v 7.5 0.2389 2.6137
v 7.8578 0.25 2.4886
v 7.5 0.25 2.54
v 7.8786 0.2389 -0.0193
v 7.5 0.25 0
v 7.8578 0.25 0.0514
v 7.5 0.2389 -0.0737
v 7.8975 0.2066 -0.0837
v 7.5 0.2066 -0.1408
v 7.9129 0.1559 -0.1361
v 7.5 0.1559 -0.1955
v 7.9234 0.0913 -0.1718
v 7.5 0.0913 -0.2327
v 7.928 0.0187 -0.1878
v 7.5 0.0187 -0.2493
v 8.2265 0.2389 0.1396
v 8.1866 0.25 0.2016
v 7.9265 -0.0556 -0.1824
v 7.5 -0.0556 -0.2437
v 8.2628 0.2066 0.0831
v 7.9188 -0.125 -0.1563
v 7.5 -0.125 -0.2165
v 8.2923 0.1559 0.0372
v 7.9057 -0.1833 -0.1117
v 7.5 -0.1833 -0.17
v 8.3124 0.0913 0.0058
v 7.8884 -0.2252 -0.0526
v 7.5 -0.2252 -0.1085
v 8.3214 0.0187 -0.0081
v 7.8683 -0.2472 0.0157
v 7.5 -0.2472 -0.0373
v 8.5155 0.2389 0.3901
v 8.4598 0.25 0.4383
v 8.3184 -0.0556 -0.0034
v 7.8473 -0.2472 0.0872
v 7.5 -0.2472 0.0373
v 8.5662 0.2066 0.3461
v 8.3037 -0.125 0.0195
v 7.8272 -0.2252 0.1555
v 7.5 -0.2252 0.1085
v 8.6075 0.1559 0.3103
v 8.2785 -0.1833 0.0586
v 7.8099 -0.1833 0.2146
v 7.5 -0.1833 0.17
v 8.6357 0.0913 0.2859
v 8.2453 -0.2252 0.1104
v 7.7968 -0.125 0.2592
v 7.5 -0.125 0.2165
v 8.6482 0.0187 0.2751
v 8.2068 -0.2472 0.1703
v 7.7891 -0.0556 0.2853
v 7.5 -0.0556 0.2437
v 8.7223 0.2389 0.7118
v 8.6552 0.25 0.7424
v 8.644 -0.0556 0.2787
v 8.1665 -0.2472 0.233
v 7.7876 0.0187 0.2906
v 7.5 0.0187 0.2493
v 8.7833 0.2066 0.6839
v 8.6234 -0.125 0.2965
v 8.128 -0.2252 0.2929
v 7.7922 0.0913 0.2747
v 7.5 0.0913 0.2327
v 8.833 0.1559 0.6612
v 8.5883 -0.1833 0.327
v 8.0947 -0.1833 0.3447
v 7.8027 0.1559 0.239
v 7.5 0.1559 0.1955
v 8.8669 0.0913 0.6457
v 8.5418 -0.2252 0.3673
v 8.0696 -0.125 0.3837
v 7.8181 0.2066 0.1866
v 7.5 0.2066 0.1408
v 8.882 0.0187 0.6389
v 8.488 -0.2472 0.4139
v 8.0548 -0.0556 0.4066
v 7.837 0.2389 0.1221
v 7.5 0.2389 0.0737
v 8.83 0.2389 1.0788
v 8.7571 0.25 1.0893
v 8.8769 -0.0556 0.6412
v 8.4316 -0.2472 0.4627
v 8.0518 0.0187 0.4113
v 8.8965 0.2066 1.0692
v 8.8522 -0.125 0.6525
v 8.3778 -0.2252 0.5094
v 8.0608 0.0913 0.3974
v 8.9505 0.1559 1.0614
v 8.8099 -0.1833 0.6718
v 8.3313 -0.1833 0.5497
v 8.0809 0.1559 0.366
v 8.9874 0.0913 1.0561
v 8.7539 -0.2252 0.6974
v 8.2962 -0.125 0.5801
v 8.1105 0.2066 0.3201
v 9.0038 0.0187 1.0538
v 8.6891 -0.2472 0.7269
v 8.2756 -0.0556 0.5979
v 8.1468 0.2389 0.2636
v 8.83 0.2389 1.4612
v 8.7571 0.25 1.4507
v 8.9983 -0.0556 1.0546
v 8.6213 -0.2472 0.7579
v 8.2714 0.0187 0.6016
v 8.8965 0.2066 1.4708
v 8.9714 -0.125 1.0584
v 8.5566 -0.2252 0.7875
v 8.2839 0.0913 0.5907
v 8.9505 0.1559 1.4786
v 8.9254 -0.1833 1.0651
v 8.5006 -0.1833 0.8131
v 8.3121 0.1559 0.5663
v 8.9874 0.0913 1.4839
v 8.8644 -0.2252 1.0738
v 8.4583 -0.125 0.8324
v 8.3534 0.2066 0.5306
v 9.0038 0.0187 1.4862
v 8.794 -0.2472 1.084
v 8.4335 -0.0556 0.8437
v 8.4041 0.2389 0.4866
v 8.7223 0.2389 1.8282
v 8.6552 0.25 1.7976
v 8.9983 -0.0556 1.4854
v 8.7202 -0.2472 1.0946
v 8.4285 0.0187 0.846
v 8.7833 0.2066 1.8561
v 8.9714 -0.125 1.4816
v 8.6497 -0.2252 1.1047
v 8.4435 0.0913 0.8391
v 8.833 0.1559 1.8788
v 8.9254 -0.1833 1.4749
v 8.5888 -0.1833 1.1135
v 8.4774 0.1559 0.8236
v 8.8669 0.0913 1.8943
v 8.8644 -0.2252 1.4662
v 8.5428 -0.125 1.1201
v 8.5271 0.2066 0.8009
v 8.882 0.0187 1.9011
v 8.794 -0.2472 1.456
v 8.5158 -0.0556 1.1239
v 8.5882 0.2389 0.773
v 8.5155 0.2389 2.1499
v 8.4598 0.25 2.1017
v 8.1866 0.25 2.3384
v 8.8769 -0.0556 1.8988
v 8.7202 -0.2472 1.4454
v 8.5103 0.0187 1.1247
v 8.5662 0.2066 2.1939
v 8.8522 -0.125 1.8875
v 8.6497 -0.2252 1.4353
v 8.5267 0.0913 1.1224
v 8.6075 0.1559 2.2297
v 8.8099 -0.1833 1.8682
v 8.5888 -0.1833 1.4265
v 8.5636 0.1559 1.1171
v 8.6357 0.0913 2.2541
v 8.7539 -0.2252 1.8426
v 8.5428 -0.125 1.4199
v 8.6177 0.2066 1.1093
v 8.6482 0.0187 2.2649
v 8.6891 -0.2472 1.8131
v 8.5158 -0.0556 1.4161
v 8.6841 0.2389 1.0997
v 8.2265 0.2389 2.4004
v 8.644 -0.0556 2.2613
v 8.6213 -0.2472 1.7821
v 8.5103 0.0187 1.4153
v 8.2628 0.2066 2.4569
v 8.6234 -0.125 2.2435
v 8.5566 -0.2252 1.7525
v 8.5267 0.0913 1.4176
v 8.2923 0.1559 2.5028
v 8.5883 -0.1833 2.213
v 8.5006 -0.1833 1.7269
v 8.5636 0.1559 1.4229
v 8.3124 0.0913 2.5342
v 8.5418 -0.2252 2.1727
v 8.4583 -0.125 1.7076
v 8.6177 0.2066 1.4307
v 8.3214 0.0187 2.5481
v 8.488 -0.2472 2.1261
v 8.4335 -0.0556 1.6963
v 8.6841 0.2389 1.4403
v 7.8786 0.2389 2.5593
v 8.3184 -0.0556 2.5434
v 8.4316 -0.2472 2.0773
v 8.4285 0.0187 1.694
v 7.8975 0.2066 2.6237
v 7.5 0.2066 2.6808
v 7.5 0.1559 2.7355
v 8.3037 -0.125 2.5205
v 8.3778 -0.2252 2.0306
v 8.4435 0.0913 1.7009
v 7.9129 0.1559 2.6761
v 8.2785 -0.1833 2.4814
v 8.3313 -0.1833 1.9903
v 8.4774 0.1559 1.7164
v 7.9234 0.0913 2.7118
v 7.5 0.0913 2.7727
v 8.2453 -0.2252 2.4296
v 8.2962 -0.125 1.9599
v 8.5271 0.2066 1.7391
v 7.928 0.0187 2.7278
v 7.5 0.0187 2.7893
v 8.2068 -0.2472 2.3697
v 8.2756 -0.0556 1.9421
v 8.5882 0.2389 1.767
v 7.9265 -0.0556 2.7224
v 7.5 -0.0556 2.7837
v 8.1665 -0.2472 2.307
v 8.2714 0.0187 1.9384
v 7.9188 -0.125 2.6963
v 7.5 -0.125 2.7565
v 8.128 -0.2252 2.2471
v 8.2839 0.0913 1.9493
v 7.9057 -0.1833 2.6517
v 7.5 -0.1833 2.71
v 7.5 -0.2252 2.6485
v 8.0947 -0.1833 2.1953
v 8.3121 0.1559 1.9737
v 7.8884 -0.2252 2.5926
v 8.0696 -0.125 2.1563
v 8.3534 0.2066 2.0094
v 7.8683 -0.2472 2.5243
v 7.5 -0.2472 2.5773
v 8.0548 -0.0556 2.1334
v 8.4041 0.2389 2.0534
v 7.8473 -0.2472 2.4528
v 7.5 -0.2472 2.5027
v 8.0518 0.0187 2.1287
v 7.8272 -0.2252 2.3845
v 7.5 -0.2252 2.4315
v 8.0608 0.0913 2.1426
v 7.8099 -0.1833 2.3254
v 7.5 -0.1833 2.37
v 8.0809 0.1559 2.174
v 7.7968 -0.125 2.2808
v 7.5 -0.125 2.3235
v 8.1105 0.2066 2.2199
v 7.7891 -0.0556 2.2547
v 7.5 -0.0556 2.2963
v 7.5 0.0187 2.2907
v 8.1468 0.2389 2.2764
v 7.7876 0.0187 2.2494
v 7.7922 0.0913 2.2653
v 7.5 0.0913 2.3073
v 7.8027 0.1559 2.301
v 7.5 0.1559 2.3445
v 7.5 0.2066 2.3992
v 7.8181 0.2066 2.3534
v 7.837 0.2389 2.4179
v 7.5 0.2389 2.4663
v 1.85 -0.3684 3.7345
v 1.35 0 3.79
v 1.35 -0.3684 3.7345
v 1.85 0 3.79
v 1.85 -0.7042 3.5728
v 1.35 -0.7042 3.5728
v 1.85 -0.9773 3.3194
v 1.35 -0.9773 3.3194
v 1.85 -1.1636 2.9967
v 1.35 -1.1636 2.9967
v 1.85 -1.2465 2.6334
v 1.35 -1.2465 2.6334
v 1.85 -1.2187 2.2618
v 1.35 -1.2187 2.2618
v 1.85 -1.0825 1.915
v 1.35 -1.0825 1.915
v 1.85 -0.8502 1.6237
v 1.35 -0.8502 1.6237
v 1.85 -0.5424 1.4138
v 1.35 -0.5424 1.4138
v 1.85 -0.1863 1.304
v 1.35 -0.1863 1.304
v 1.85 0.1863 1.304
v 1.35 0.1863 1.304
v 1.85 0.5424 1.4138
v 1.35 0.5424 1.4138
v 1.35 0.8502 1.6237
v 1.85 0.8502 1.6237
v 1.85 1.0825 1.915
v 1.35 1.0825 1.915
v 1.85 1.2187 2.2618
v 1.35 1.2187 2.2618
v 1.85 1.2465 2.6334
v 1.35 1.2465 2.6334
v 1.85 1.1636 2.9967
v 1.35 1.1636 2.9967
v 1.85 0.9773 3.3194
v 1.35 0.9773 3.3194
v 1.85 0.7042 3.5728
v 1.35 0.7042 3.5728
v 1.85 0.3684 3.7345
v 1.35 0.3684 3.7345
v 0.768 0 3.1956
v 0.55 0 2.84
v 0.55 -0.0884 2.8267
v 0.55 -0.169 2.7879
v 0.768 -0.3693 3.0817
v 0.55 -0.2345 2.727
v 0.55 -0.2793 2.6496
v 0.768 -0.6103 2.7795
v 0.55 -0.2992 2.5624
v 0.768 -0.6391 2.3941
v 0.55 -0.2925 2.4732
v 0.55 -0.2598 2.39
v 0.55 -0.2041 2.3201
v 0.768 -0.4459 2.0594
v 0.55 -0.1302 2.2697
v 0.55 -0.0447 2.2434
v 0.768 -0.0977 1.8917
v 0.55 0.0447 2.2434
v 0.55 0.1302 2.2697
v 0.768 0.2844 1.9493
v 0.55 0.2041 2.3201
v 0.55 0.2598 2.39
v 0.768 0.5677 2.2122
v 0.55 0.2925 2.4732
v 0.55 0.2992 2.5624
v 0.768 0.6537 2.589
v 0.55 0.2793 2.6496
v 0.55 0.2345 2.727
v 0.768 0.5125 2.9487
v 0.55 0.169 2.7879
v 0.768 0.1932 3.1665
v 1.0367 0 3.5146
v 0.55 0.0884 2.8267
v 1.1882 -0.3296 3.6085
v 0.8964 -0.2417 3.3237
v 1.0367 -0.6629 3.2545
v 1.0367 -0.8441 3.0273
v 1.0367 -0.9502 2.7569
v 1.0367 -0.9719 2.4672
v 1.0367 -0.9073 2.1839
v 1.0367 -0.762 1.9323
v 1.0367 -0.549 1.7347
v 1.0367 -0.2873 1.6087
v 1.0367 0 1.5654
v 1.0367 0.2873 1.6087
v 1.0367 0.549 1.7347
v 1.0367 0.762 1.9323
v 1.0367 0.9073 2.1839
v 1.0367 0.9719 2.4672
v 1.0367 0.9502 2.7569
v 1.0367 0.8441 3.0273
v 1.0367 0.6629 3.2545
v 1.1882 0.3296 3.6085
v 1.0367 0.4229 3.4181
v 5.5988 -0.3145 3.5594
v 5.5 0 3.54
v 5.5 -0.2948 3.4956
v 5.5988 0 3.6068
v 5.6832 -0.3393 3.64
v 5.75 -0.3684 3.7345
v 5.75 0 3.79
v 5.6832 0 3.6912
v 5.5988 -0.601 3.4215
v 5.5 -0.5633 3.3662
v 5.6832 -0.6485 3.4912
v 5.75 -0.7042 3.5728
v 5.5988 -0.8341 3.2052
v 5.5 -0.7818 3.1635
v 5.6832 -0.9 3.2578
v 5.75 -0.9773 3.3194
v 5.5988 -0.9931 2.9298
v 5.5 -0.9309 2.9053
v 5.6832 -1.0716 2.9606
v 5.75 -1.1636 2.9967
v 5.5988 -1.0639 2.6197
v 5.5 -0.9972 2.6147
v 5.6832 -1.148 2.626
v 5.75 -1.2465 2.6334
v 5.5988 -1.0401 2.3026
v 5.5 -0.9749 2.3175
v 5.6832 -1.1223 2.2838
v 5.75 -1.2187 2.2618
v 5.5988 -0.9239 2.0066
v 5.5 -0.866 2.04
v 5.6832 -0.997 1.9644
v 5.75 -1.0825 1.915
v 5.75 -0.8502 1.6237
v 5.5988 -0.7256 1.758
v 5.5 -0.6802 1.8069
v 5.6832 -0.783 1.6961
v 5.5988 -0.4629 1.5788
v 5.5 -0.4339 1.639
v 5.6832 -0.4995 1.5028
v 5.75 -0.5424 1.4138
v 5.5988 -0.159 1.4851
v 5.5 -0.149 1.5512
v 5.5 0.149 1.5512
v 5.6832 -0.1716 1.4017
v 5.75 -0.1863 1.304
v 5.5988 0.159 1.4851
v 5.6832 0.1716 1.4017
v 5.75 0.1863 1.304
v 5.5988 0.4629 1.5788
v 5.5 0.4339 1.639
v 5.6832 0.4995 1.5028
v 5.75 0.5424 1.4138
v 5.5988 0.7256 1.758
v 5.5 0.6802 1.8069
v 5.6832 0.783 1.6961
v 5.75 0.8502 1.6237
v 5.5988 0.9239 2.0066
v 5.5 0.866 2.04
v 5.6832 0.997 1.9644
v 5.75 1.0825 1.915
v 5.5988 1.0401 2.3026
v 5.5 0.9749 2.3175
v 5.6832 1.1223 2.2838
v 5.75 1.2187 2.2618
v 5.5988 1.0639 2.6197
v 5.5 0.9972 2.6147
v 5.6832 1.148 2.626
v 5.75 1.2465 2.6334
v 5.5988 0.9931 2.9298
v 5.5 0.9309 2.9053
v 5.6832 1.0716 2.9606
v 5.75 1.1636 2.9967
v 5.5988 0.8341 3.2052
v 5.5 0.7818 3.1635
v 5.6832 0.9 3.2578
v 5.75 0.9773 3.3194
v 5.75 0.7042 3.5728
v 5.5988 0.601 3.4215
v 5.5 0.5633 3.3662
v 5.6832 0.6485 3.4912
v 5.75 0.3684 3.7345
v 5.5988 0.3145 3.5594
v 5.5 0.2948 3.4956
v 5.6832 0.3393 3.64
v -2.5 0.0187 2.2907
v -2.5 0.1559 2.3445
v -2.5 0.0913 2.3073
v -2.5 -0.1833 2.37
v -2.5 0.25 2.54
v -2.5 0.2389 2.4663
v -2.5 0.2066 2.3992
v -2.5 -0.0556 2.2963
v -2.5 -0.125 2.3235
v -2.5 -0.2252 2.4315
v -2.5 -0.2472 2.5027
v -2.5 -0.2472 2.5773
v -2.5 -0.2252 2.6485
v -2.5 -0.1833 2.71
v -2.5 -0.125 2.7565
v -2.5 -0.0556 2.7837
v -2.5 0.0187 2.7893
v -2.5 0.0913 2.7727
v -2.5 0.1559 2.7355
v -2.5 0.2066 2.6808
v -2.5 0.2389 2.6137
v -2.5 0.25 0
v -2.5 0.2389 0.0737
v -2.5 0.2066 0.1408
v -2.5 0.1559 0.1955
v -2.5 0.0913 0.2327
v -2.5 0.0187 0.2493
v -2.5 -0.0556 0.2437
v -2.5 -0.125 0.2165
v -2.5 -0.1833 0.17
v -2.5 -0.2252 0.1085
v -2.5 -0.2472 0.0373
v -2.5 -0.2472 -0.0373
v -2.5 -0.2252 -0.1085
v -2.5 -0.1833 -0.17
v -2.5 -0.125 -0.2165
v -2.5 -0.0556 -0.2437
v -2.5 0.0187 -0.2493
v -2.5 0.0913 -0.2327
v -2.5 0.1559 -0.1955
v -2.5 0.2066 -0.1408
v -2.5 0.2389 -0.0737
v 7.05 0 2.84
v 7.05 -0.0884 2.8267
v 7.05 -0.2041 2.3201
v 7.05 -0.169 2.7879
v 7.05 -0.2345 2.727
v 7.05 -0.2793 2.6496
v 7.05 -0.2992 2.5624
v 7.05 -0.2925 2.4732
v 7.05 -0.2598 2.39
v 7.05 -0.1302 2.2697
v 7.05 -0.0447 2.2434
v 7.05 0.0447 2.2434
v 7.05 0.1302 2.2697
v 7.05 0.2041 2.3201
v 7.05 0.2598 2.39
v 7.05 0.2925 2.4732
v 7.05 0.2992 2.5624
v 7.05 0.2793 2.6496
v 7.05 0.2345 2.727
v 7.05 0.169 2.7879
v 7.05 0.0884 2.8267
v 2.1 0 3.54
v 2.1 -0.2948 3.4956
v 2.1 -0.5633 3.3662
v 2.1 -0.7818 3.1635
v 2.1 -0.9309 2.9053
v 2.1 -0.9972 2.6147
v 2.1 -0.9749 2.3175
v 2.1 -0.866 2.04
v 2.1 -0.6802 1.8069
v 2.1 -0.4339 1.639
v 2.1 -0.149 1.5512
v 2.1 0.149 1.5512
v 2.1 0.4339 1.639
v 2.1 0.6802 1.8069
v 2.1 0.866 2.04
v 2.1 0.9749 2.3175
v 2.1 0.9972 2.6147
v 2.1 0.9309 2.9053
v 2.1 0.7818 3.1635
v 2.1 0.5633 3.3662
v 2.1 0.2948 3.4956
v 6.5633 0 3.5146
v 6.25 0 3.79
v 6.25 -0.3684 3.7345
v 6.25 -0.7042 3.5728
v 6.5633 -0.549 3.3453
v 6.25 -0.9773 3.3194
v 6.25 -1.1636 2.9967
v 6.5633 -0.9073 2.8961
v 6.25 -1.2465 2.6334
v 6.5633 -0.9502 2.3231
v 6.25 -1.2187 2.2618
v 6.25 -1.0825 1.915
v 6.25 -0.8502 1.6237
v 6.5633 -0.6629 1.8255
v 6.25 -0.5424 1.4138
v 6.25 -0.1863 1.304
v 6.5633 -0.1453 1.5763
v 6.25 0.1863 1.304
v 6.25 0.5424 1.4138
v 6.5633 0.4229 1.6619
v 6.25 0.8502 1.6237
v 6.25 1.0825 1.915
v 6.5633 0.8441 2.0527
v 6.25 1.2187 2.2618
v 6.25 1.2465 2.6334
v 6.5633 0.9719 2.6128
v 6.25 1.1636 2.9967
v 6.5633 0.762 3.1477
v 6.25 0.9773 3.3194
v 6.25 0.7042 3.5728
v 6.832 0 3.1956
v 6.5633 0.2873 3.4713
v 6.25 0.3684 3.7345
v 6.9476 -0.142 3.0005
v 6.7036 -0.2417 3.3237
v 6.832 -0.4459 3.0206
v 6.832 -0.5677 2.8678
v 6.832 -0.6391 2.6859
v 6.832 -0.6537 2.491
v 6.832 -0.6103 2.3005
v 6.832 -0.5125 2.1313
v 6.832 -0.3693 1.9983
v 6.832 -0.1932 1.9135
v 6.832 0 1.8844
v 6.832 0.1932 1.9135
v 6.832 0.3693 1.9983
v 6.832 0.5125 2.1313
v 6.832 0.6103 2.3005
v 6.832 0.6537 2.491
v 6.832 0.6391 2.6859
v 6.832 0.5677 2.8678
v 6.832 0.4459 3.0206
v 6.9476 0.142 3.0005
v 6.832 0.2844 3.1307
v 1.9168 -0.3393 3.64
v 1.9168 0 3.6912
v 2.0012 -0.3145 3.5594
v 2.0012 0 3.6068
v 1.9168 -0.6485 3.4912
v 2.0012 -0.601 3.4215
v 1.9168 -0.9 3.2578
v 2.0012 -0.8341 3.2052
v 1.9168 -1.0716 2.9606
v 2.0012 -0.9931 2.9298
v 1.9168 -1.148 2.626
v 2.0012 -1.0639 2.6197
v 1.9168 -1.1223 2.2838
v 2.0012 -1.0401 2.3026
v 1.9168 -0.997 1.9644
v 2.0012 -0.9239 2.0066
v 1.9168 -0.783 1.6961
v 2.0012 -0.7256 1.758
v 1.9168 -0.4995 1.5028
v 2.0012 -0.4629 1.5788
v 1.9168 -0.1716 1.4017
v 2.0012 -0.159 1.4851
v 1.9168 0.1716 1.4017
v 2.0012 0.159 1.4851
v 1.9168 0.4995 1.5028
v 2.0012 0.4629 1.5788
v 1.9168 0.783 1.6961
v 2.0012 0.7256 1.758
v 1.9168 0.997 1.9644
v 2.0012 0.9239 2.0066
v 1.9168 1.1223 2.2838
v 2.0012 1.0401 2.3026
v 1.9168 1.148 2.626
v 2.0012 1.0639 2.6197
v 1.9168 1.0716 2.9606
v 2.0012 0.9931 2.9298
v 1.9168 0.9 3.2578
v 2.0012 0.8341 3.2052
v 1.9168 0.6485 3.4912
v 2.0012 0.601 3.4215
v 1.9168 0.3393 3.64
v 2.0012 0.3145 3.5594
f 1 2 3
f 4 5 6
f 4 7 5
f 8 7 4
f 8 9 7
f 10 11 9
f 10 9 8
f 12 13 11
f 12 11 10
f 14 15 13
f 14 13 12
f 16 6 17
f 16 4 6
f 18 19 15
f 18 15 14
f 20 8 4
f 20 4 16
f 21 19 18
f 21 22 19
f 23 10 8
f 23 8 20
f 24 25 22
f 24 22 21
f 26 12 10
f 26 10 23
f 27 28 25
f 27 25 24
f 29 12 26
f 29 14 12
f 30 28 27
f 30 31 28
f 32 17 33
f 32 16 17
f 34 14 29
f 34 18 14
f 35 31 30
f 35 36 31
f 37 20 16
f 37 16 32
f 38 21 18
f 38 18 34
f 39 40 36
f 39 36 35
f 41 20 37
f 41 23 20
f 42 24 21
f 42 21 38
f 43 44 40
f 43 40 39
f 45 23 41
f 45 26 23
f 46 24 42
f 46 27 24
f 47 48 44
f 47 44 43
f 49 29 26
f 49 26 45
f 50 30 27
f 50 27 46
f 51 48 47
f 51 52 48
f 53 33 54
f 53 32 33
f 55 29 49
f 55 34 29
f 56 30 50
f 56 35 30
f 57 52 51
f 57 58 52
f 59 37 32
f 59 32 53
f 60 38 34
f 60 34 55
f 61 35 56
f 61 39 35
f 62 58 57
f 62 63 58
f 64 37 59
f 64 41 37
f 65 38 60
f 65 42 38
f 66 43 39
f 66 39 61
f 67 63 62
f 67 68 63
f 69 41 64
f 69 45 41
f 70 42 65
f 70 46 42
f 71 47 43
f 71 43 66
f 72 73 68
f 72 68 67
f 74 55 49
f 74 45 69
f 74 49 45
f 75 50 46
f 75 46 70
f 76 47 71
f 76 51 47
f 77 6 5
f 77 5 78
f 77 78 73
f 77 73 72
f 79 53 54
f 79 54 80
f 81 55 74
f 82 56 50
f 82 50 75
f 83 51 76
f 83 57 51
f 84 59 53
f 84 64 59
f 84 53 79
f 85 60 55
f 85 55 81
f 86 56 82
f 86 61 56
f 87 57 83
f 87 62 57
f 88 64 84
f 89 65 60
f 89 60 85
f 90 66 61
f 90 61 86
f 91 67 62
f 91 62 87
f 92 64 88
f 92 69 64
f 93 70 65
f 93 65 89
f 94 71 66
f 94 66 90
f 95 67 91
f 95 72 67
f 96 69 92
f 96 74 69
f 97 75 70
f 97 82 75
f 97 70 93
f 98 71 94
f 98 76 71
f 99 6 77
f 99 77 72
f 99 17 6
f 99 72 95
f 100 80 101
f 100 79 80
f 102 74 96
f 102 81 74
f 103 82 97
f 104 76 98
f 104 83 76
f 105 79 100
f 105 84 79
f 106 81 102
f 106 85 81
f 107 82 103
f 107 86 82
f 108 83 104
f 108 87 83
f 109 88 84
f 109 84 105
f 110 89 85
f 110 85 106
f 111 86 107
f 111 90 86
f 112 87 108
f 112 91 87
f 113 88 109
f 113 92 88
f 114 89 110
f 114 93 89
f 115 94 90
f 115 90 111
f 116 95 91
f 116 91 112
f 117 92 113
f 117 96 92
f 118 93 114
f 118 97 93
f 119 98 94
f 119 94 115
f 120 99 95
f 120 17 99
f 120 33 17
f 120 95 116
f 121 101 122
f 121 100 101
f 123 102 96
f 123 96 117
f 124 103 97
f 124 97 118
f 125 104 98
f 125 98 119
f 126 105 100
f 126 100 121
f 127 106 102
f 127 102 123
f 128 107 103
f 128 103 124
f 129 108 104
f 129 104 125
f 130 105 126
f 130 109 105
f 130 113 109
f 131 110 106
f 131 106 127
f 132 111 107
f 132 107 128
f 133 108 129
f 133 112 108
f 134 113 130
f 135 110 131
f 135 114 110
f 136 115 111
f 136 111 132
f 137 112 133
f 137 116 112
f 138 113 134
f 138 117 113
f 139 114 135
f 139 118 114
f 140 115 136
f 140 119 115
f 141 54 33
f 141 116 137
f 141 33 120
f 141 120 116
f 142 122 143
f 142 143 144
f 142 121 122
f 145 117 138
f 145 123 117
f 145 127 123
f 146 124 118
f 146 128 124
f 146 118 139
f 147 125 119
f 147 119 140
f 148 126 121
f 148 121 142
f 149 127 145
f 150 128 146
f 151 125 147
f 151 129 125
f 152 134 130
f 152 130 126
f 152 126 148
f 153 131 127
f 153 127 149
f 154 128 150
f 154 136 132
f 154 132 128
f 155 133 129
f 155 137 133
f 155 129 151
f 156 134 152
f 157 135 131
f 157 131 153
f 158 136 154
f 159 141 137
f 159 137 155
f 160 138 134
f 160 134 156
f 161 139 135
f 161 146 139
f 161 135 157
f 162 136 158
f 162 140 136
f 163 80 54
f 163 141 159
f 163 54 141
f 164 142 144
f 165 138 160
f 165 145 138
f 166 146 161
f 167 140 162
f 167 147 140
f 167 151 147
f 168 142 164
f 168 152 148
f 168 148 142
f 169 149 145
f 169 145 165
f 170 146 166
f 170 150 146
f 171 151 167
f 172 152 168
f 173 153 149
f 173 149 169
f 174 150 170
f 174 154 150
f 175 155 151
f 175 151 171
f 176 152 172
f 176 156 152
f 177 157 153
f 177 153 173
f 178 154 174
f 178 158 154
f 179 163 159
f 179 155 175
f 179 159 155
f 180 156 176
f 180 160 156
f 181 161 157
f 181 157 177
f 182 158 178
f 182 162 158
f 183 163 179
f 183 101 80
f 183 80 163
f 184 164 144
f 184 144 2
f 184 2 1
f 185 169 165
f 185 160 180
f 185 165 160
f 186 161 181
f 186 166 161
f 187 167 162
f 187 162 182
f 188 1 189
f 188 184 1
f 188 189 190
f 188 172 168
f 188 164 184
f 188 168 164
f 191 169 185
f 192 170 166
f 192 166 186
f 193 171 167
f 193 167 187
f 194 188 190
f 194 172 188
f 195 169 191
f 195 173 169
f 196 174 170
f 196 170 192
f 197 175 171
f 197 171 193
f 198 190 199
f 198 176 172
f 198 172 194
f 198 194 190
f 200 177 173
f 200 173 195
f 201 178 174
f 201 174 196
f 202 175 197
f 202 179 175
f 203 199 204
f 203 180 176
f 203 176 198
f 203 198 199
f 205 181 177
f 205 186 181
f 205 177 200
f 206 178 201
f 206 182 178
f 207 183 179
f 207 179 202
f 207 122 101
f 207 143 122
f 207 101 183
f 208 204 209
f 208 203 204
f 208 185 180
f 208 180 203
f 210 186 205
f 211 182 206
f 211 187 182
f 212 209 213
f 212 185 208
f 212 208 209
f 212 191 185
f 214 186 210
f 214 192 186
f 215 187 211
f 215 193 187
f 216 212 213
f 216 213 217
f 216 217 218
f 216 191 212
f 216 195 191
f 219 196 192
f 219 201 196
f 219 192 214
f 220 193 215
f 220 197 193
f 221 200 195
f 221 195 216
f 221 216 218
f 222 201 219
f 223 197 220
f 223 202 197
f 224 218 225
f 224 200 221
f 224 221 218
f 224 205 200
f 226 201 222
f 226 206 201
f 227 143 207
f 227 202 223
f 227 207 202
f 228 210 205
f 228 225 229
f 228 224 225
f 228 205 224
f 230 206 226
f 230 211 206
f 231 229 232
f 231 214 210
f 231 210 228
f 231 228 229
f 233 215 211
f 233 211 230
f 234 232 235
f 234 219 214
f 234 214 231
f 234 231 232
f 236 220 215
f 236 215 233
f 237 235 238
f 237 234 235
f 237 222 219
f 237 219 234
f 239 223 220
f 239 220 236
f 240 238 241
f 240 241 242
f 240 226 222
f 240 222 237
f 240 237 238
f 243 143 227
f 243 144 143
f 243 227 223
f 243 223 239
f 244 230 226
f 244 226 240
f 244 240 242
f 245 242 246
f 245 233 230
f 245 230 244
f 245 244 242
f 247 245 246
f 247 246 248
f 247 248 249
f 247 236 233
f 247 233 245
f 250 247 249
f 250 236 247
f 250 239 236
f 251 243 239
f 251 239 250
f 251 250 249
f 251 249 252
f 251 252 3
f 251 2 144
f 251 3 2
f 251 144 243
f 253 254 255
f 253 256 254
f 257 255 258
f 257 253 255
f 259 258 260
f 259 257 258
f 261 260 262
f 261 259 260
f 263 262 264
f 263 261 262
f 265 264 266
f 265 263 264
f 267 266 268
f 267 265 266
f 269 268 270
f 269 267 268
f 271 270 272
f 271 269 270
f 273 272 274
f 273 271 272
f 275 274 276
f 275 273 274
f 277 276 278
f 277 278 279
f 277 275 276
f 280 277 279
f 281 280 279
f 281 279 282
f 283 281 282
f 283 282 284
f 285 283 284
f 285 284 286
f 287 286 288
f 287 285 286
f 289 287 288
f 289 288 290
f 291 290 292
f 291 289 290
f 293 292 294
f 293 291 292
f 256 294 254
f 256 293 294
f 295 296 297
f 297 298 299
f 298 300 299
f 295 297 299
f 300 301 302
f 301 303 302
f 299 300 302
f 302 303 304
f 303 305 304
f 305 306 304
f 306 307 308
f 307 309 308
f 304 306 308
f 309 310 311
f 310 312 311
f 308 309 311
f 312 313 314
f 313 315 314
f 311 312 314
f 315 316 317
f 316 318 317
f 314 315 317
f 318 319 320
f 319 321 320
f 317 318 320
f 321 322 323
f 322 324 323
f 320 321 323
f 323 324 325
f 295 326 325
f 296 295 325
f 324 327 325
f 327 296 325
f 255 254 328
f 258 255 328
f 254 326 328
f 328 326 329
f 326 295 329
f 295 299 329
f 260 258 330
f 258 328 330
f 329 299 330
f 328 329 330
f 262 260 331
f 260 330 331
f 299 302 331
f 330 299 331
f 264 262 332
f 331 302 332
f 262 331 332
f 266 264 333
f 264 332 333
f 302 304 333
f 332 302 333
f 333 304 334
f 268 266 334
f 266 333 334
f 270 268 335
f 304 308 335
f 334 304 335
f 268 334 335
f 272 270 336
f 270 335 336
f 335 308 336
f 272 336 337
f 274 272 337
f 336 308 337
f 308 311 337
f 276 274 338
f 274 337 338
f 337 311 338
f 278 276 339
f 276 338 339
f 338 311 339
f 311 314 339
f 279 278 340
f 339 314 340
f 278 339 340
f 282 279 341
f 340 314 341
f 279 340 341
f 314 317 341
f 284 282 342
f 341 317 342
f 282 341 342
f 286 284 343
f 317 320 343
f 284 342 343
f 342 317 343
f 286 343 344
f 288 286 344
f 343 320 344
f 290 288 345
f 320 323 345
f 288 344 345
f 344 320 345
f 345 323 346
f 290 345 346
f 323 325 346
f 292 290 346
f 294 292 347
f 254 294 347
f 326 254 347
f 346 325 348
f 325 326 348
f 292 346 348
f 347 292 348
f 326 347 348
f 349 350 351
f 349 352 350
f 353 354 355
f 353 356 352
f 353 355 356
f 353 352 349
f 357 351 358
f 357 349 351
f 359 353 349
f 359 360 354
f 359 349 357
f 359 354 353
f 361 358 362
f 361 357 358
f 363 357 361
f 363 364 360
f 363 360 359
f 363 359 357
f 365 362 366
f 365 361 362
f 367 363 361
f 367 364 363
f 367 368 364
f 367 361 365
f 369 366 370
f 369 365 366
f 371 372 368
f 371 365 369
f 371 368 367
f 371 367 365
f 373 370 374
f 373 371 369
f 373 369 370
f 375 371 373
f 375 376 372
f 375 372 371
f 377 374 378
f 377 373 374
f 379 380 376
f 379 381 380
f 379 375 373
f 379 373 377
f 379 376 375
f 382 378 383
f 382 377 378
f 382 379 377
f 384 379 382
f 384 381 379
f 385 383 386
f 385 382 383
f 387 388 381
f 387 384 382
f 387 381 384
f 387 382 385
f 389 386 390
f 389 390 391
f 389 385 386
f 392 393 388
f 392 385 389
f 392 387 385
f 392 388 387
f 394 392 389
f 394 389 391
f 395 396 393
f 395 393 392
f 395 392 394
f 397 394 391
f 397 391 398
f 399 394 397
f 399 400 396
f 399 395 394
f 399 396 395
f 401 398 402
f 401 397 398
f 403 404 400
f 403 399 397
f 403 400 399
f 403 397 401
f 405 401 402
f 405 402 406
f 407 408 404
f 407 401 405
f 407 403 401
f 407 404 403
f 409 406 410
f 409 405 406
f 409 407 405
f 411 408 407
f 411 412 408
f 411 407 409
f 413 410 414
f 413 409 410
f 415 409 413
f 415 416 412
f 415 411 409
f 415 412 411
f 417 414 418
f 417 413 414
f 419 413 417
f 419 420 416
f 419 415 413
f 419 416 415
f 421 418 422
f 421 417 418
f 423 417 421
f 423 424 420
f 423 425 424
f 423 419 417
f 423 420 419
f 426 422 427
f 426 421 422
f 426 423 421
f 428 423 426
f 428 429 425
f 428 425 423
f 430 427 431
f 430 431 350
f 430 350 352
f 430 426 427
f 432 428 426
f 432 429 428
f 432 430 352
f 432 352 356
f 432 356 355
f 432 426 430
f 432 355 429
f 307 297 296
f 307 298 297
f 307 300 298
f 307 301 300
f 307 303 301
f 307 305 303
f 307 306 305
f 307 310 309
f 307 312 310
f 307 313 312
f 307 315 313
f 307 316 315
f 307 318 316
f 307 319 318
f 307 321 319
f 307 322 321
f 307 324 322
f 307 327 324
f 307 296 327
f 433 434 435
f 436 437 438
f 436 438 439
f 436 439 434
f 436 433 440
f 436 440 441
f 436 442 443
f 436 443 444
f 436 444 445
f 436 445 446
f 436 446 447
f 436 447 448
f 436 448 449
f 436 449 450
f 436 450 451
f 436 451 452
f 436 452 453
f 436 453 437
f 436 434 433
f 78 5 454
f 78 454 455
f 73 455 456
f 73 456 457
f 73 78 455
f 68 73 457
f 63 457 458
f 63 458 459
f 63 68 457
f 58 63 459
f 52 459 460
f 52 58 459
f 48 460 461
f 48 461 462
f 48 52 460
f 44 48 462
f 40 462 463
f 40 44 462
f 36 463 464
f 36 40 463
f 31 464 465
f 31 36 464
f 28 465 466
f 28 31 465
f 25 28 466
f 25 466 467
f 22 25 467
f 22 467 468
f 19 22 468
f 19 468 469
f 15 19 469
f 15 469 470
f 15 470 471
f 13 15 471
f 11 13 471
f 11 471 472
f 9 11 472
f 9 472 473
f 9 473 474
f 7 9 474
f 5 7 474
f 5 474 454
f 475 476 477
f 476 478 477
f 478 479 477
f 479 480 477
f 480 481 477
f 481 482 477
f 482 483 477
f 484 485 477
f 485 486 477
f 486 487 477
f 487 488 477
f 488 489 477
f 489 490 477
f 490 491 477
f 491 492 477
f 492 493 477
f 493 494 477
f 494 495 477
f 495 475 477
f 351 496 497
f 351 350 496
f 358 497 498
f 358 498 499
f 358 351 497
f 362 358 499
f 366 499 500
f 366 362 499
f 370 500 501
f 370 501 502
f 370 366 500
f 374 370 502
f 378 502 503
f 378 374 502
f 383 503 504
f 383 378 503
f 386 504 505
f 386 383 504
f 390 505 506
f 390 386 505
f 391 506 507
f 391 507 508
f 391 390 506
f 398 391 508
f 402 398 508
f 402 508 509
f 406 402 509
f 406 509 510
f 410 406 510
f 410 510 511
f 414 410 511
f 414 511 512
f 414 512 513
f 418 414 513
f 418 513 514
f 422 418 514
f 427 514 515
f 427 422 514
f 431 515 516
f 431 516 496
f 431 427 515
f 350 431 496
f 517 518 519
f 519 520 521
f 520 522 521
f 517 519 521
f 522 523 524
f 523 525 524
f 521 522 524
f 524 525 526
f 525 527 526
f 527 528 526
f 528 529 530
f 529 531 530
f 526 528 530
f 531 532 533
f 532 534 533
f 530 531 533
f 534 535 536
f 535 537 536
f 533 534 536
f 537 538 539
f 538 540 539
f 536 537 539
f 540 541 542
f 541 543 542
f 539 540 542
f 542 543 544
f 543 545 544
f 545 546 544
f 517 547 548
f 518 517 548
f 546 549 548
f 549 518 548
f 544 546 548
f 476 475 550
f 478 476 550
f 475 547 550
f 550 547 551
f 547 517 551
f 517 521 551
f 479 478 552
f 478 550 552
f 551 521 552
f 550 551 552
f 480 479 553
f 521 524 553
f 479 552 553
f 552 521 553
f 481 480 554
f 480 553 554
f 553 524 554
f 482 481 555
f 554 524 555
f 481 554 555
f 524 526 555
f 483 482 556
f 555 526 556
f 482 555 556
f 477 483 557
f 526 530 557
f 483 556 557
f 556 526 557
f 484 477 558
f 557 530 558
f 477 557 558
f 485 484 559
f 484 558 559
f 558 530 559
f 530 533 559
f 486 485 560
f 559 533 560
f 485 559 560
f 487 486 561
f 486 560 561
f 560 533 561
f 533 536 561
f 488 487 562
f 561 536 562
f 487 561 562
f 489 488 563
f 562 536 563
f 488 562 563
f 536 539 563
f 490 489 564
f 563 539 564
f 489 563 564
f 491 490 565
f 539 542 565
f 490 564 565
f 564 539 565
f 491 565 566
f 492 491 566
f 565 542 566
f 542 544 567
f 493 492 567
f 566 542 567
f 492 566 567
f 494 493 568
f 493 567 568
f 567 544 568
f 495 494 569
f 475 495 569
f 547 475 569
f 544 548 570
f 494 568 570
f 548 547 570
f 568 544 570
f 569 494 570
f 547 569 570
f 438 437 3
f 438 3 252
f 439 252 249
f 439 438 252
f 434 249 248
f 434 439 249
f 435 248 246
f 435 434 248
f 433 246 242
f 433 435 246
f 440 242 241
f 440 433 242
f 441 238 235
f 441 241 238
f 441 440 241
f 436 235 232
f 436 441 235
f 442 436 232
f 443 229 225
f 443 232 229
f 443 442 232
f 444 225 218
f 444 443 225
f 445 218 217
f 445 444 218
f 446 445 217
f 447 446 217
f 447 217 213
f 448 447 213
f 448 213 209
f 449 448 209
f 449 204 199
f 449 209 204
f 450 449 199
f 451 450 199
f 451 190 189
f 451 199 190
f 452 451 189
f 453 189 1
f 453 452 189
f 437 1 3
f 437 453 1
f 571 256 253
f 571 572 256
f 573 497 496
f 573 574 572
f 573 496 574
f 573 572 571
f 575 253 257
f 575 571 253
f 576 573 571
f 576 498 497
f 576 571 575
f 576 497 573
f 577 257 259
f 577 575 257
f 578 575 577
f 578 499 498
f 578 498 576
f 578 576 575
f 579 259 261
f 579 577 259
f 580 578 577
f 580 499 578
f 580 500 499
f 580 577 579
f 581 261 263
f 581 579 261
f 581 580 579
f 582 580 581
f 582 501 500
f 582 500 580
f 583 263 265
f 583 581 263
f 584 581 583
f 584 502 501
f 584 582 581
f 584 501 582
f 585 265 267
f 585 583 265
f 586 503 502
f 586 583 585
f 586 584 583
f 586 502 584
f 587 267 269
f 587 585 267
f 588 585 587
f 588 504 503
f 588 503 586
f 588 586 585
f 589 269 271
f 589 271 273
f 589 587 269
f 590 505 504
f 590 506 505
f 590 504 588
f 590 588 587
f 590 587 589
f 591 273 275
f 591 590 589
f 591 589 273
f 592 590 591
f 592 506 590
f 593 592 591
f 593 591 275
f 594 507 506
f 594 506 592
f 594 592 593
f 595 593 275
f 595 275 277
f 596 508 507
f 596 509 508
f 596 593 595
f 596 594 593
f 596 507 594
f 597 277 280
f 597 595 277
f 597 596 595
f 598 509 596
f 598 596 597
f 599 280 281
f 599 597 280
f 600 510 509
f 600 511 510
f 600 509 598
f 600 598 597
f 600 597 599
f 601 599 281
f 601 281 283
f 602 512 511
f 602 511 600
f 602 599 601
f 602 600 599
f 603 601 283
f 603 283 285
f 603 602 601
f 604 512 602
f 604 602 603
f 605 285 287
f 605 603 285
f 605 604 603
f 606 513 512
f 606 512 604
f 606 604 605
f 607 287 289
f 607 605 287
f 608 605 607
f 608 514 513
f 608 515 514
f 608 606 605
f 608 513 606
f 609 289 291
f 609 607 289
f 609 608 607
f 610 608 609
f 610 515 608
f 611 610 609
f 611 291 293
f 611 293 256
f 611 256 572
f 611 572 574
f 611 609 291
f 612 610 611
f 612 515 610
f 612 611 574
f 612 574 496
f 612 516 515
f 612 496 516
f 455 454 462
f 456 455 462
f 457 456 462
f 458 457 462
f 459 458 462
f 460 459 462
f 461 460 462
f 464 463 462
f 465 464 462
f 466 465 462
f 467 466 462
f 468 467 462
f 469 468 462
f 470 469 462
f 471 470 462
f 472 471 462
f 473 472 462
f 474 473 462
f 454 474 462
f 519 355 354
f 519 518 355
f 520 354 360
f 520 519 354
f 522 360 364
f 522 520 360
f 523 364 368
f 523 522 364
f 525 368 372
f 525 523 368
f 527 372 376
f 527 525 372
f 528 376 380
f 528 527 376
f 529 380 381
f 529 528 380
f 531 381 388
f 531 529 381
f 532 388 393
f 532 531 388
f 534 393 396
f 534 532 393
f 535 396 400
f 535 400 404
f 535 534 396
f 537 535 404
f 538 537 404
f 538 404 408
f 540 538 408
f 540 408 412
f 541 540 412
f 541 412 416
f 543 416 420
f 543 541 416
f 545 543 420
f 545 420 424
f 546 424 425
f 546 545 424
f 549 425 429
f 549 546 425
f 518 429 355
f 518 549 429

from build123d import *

# Parameters (mm, degrees)
SKETCH_R = 0.25


with BuildPart() as revolution:
    # Sketch002 → Revolution (revolve)
    with BuildSketch(Plane.XZ):
        with BuildLine():
            Line((1.35, 3.79), (1.85, 3.79))
            ThreePointArc((1.85, 3.79), (1.956999, 3.646999), (2.1, 3.54))
            Line((2.1, 3.54), (5.5, 3.54))
            ThreePointArc((5.5, 3.54), (5.643001, 3.646999), (5.75, 3.79))
            Line((5.75, 3.79), (6.25, 3.79))
            ThreePointArc((7.05, 2.84), (6.703597, 3.360134), (6.25, 3.79))
            Line((7.05, 2.54), (7.05, 2.84))
            Line((0.55, 2.54), (7.05, 2.54))
            Line((0.55, 2.54), (0.55, 2.84))
            ThreePointArc((1.35, 3.79), (0.896403, 3.360134), (0.55, 2.84))
        make_face()
    revolve(axis=Axis((0.55, 0, 2.54), (1, 0, 0)))


with BuildPart() as sweep_body:
    # Sweep: sweep along a path in Sketch001
    with BuildLine(Plane.XZ) as sweep_path:
        Line((-2.5, 0), (7.5, 0))
        ThreePointArc((7.5, 0), (8.77, 1.27), (7.5, 2.54))
        Line((7.5, 2.54), (-2.5, 2.54))
    # Sketch → Sweep (sweep)
    with BuildSketch(Plane.YZ.offset(-2.5)):
        Circle(SKETCH_R)
    sweep(path=sweep_path.line, is_frenet=True)


solid = Compound([revolution.part, sweep_body.part])
